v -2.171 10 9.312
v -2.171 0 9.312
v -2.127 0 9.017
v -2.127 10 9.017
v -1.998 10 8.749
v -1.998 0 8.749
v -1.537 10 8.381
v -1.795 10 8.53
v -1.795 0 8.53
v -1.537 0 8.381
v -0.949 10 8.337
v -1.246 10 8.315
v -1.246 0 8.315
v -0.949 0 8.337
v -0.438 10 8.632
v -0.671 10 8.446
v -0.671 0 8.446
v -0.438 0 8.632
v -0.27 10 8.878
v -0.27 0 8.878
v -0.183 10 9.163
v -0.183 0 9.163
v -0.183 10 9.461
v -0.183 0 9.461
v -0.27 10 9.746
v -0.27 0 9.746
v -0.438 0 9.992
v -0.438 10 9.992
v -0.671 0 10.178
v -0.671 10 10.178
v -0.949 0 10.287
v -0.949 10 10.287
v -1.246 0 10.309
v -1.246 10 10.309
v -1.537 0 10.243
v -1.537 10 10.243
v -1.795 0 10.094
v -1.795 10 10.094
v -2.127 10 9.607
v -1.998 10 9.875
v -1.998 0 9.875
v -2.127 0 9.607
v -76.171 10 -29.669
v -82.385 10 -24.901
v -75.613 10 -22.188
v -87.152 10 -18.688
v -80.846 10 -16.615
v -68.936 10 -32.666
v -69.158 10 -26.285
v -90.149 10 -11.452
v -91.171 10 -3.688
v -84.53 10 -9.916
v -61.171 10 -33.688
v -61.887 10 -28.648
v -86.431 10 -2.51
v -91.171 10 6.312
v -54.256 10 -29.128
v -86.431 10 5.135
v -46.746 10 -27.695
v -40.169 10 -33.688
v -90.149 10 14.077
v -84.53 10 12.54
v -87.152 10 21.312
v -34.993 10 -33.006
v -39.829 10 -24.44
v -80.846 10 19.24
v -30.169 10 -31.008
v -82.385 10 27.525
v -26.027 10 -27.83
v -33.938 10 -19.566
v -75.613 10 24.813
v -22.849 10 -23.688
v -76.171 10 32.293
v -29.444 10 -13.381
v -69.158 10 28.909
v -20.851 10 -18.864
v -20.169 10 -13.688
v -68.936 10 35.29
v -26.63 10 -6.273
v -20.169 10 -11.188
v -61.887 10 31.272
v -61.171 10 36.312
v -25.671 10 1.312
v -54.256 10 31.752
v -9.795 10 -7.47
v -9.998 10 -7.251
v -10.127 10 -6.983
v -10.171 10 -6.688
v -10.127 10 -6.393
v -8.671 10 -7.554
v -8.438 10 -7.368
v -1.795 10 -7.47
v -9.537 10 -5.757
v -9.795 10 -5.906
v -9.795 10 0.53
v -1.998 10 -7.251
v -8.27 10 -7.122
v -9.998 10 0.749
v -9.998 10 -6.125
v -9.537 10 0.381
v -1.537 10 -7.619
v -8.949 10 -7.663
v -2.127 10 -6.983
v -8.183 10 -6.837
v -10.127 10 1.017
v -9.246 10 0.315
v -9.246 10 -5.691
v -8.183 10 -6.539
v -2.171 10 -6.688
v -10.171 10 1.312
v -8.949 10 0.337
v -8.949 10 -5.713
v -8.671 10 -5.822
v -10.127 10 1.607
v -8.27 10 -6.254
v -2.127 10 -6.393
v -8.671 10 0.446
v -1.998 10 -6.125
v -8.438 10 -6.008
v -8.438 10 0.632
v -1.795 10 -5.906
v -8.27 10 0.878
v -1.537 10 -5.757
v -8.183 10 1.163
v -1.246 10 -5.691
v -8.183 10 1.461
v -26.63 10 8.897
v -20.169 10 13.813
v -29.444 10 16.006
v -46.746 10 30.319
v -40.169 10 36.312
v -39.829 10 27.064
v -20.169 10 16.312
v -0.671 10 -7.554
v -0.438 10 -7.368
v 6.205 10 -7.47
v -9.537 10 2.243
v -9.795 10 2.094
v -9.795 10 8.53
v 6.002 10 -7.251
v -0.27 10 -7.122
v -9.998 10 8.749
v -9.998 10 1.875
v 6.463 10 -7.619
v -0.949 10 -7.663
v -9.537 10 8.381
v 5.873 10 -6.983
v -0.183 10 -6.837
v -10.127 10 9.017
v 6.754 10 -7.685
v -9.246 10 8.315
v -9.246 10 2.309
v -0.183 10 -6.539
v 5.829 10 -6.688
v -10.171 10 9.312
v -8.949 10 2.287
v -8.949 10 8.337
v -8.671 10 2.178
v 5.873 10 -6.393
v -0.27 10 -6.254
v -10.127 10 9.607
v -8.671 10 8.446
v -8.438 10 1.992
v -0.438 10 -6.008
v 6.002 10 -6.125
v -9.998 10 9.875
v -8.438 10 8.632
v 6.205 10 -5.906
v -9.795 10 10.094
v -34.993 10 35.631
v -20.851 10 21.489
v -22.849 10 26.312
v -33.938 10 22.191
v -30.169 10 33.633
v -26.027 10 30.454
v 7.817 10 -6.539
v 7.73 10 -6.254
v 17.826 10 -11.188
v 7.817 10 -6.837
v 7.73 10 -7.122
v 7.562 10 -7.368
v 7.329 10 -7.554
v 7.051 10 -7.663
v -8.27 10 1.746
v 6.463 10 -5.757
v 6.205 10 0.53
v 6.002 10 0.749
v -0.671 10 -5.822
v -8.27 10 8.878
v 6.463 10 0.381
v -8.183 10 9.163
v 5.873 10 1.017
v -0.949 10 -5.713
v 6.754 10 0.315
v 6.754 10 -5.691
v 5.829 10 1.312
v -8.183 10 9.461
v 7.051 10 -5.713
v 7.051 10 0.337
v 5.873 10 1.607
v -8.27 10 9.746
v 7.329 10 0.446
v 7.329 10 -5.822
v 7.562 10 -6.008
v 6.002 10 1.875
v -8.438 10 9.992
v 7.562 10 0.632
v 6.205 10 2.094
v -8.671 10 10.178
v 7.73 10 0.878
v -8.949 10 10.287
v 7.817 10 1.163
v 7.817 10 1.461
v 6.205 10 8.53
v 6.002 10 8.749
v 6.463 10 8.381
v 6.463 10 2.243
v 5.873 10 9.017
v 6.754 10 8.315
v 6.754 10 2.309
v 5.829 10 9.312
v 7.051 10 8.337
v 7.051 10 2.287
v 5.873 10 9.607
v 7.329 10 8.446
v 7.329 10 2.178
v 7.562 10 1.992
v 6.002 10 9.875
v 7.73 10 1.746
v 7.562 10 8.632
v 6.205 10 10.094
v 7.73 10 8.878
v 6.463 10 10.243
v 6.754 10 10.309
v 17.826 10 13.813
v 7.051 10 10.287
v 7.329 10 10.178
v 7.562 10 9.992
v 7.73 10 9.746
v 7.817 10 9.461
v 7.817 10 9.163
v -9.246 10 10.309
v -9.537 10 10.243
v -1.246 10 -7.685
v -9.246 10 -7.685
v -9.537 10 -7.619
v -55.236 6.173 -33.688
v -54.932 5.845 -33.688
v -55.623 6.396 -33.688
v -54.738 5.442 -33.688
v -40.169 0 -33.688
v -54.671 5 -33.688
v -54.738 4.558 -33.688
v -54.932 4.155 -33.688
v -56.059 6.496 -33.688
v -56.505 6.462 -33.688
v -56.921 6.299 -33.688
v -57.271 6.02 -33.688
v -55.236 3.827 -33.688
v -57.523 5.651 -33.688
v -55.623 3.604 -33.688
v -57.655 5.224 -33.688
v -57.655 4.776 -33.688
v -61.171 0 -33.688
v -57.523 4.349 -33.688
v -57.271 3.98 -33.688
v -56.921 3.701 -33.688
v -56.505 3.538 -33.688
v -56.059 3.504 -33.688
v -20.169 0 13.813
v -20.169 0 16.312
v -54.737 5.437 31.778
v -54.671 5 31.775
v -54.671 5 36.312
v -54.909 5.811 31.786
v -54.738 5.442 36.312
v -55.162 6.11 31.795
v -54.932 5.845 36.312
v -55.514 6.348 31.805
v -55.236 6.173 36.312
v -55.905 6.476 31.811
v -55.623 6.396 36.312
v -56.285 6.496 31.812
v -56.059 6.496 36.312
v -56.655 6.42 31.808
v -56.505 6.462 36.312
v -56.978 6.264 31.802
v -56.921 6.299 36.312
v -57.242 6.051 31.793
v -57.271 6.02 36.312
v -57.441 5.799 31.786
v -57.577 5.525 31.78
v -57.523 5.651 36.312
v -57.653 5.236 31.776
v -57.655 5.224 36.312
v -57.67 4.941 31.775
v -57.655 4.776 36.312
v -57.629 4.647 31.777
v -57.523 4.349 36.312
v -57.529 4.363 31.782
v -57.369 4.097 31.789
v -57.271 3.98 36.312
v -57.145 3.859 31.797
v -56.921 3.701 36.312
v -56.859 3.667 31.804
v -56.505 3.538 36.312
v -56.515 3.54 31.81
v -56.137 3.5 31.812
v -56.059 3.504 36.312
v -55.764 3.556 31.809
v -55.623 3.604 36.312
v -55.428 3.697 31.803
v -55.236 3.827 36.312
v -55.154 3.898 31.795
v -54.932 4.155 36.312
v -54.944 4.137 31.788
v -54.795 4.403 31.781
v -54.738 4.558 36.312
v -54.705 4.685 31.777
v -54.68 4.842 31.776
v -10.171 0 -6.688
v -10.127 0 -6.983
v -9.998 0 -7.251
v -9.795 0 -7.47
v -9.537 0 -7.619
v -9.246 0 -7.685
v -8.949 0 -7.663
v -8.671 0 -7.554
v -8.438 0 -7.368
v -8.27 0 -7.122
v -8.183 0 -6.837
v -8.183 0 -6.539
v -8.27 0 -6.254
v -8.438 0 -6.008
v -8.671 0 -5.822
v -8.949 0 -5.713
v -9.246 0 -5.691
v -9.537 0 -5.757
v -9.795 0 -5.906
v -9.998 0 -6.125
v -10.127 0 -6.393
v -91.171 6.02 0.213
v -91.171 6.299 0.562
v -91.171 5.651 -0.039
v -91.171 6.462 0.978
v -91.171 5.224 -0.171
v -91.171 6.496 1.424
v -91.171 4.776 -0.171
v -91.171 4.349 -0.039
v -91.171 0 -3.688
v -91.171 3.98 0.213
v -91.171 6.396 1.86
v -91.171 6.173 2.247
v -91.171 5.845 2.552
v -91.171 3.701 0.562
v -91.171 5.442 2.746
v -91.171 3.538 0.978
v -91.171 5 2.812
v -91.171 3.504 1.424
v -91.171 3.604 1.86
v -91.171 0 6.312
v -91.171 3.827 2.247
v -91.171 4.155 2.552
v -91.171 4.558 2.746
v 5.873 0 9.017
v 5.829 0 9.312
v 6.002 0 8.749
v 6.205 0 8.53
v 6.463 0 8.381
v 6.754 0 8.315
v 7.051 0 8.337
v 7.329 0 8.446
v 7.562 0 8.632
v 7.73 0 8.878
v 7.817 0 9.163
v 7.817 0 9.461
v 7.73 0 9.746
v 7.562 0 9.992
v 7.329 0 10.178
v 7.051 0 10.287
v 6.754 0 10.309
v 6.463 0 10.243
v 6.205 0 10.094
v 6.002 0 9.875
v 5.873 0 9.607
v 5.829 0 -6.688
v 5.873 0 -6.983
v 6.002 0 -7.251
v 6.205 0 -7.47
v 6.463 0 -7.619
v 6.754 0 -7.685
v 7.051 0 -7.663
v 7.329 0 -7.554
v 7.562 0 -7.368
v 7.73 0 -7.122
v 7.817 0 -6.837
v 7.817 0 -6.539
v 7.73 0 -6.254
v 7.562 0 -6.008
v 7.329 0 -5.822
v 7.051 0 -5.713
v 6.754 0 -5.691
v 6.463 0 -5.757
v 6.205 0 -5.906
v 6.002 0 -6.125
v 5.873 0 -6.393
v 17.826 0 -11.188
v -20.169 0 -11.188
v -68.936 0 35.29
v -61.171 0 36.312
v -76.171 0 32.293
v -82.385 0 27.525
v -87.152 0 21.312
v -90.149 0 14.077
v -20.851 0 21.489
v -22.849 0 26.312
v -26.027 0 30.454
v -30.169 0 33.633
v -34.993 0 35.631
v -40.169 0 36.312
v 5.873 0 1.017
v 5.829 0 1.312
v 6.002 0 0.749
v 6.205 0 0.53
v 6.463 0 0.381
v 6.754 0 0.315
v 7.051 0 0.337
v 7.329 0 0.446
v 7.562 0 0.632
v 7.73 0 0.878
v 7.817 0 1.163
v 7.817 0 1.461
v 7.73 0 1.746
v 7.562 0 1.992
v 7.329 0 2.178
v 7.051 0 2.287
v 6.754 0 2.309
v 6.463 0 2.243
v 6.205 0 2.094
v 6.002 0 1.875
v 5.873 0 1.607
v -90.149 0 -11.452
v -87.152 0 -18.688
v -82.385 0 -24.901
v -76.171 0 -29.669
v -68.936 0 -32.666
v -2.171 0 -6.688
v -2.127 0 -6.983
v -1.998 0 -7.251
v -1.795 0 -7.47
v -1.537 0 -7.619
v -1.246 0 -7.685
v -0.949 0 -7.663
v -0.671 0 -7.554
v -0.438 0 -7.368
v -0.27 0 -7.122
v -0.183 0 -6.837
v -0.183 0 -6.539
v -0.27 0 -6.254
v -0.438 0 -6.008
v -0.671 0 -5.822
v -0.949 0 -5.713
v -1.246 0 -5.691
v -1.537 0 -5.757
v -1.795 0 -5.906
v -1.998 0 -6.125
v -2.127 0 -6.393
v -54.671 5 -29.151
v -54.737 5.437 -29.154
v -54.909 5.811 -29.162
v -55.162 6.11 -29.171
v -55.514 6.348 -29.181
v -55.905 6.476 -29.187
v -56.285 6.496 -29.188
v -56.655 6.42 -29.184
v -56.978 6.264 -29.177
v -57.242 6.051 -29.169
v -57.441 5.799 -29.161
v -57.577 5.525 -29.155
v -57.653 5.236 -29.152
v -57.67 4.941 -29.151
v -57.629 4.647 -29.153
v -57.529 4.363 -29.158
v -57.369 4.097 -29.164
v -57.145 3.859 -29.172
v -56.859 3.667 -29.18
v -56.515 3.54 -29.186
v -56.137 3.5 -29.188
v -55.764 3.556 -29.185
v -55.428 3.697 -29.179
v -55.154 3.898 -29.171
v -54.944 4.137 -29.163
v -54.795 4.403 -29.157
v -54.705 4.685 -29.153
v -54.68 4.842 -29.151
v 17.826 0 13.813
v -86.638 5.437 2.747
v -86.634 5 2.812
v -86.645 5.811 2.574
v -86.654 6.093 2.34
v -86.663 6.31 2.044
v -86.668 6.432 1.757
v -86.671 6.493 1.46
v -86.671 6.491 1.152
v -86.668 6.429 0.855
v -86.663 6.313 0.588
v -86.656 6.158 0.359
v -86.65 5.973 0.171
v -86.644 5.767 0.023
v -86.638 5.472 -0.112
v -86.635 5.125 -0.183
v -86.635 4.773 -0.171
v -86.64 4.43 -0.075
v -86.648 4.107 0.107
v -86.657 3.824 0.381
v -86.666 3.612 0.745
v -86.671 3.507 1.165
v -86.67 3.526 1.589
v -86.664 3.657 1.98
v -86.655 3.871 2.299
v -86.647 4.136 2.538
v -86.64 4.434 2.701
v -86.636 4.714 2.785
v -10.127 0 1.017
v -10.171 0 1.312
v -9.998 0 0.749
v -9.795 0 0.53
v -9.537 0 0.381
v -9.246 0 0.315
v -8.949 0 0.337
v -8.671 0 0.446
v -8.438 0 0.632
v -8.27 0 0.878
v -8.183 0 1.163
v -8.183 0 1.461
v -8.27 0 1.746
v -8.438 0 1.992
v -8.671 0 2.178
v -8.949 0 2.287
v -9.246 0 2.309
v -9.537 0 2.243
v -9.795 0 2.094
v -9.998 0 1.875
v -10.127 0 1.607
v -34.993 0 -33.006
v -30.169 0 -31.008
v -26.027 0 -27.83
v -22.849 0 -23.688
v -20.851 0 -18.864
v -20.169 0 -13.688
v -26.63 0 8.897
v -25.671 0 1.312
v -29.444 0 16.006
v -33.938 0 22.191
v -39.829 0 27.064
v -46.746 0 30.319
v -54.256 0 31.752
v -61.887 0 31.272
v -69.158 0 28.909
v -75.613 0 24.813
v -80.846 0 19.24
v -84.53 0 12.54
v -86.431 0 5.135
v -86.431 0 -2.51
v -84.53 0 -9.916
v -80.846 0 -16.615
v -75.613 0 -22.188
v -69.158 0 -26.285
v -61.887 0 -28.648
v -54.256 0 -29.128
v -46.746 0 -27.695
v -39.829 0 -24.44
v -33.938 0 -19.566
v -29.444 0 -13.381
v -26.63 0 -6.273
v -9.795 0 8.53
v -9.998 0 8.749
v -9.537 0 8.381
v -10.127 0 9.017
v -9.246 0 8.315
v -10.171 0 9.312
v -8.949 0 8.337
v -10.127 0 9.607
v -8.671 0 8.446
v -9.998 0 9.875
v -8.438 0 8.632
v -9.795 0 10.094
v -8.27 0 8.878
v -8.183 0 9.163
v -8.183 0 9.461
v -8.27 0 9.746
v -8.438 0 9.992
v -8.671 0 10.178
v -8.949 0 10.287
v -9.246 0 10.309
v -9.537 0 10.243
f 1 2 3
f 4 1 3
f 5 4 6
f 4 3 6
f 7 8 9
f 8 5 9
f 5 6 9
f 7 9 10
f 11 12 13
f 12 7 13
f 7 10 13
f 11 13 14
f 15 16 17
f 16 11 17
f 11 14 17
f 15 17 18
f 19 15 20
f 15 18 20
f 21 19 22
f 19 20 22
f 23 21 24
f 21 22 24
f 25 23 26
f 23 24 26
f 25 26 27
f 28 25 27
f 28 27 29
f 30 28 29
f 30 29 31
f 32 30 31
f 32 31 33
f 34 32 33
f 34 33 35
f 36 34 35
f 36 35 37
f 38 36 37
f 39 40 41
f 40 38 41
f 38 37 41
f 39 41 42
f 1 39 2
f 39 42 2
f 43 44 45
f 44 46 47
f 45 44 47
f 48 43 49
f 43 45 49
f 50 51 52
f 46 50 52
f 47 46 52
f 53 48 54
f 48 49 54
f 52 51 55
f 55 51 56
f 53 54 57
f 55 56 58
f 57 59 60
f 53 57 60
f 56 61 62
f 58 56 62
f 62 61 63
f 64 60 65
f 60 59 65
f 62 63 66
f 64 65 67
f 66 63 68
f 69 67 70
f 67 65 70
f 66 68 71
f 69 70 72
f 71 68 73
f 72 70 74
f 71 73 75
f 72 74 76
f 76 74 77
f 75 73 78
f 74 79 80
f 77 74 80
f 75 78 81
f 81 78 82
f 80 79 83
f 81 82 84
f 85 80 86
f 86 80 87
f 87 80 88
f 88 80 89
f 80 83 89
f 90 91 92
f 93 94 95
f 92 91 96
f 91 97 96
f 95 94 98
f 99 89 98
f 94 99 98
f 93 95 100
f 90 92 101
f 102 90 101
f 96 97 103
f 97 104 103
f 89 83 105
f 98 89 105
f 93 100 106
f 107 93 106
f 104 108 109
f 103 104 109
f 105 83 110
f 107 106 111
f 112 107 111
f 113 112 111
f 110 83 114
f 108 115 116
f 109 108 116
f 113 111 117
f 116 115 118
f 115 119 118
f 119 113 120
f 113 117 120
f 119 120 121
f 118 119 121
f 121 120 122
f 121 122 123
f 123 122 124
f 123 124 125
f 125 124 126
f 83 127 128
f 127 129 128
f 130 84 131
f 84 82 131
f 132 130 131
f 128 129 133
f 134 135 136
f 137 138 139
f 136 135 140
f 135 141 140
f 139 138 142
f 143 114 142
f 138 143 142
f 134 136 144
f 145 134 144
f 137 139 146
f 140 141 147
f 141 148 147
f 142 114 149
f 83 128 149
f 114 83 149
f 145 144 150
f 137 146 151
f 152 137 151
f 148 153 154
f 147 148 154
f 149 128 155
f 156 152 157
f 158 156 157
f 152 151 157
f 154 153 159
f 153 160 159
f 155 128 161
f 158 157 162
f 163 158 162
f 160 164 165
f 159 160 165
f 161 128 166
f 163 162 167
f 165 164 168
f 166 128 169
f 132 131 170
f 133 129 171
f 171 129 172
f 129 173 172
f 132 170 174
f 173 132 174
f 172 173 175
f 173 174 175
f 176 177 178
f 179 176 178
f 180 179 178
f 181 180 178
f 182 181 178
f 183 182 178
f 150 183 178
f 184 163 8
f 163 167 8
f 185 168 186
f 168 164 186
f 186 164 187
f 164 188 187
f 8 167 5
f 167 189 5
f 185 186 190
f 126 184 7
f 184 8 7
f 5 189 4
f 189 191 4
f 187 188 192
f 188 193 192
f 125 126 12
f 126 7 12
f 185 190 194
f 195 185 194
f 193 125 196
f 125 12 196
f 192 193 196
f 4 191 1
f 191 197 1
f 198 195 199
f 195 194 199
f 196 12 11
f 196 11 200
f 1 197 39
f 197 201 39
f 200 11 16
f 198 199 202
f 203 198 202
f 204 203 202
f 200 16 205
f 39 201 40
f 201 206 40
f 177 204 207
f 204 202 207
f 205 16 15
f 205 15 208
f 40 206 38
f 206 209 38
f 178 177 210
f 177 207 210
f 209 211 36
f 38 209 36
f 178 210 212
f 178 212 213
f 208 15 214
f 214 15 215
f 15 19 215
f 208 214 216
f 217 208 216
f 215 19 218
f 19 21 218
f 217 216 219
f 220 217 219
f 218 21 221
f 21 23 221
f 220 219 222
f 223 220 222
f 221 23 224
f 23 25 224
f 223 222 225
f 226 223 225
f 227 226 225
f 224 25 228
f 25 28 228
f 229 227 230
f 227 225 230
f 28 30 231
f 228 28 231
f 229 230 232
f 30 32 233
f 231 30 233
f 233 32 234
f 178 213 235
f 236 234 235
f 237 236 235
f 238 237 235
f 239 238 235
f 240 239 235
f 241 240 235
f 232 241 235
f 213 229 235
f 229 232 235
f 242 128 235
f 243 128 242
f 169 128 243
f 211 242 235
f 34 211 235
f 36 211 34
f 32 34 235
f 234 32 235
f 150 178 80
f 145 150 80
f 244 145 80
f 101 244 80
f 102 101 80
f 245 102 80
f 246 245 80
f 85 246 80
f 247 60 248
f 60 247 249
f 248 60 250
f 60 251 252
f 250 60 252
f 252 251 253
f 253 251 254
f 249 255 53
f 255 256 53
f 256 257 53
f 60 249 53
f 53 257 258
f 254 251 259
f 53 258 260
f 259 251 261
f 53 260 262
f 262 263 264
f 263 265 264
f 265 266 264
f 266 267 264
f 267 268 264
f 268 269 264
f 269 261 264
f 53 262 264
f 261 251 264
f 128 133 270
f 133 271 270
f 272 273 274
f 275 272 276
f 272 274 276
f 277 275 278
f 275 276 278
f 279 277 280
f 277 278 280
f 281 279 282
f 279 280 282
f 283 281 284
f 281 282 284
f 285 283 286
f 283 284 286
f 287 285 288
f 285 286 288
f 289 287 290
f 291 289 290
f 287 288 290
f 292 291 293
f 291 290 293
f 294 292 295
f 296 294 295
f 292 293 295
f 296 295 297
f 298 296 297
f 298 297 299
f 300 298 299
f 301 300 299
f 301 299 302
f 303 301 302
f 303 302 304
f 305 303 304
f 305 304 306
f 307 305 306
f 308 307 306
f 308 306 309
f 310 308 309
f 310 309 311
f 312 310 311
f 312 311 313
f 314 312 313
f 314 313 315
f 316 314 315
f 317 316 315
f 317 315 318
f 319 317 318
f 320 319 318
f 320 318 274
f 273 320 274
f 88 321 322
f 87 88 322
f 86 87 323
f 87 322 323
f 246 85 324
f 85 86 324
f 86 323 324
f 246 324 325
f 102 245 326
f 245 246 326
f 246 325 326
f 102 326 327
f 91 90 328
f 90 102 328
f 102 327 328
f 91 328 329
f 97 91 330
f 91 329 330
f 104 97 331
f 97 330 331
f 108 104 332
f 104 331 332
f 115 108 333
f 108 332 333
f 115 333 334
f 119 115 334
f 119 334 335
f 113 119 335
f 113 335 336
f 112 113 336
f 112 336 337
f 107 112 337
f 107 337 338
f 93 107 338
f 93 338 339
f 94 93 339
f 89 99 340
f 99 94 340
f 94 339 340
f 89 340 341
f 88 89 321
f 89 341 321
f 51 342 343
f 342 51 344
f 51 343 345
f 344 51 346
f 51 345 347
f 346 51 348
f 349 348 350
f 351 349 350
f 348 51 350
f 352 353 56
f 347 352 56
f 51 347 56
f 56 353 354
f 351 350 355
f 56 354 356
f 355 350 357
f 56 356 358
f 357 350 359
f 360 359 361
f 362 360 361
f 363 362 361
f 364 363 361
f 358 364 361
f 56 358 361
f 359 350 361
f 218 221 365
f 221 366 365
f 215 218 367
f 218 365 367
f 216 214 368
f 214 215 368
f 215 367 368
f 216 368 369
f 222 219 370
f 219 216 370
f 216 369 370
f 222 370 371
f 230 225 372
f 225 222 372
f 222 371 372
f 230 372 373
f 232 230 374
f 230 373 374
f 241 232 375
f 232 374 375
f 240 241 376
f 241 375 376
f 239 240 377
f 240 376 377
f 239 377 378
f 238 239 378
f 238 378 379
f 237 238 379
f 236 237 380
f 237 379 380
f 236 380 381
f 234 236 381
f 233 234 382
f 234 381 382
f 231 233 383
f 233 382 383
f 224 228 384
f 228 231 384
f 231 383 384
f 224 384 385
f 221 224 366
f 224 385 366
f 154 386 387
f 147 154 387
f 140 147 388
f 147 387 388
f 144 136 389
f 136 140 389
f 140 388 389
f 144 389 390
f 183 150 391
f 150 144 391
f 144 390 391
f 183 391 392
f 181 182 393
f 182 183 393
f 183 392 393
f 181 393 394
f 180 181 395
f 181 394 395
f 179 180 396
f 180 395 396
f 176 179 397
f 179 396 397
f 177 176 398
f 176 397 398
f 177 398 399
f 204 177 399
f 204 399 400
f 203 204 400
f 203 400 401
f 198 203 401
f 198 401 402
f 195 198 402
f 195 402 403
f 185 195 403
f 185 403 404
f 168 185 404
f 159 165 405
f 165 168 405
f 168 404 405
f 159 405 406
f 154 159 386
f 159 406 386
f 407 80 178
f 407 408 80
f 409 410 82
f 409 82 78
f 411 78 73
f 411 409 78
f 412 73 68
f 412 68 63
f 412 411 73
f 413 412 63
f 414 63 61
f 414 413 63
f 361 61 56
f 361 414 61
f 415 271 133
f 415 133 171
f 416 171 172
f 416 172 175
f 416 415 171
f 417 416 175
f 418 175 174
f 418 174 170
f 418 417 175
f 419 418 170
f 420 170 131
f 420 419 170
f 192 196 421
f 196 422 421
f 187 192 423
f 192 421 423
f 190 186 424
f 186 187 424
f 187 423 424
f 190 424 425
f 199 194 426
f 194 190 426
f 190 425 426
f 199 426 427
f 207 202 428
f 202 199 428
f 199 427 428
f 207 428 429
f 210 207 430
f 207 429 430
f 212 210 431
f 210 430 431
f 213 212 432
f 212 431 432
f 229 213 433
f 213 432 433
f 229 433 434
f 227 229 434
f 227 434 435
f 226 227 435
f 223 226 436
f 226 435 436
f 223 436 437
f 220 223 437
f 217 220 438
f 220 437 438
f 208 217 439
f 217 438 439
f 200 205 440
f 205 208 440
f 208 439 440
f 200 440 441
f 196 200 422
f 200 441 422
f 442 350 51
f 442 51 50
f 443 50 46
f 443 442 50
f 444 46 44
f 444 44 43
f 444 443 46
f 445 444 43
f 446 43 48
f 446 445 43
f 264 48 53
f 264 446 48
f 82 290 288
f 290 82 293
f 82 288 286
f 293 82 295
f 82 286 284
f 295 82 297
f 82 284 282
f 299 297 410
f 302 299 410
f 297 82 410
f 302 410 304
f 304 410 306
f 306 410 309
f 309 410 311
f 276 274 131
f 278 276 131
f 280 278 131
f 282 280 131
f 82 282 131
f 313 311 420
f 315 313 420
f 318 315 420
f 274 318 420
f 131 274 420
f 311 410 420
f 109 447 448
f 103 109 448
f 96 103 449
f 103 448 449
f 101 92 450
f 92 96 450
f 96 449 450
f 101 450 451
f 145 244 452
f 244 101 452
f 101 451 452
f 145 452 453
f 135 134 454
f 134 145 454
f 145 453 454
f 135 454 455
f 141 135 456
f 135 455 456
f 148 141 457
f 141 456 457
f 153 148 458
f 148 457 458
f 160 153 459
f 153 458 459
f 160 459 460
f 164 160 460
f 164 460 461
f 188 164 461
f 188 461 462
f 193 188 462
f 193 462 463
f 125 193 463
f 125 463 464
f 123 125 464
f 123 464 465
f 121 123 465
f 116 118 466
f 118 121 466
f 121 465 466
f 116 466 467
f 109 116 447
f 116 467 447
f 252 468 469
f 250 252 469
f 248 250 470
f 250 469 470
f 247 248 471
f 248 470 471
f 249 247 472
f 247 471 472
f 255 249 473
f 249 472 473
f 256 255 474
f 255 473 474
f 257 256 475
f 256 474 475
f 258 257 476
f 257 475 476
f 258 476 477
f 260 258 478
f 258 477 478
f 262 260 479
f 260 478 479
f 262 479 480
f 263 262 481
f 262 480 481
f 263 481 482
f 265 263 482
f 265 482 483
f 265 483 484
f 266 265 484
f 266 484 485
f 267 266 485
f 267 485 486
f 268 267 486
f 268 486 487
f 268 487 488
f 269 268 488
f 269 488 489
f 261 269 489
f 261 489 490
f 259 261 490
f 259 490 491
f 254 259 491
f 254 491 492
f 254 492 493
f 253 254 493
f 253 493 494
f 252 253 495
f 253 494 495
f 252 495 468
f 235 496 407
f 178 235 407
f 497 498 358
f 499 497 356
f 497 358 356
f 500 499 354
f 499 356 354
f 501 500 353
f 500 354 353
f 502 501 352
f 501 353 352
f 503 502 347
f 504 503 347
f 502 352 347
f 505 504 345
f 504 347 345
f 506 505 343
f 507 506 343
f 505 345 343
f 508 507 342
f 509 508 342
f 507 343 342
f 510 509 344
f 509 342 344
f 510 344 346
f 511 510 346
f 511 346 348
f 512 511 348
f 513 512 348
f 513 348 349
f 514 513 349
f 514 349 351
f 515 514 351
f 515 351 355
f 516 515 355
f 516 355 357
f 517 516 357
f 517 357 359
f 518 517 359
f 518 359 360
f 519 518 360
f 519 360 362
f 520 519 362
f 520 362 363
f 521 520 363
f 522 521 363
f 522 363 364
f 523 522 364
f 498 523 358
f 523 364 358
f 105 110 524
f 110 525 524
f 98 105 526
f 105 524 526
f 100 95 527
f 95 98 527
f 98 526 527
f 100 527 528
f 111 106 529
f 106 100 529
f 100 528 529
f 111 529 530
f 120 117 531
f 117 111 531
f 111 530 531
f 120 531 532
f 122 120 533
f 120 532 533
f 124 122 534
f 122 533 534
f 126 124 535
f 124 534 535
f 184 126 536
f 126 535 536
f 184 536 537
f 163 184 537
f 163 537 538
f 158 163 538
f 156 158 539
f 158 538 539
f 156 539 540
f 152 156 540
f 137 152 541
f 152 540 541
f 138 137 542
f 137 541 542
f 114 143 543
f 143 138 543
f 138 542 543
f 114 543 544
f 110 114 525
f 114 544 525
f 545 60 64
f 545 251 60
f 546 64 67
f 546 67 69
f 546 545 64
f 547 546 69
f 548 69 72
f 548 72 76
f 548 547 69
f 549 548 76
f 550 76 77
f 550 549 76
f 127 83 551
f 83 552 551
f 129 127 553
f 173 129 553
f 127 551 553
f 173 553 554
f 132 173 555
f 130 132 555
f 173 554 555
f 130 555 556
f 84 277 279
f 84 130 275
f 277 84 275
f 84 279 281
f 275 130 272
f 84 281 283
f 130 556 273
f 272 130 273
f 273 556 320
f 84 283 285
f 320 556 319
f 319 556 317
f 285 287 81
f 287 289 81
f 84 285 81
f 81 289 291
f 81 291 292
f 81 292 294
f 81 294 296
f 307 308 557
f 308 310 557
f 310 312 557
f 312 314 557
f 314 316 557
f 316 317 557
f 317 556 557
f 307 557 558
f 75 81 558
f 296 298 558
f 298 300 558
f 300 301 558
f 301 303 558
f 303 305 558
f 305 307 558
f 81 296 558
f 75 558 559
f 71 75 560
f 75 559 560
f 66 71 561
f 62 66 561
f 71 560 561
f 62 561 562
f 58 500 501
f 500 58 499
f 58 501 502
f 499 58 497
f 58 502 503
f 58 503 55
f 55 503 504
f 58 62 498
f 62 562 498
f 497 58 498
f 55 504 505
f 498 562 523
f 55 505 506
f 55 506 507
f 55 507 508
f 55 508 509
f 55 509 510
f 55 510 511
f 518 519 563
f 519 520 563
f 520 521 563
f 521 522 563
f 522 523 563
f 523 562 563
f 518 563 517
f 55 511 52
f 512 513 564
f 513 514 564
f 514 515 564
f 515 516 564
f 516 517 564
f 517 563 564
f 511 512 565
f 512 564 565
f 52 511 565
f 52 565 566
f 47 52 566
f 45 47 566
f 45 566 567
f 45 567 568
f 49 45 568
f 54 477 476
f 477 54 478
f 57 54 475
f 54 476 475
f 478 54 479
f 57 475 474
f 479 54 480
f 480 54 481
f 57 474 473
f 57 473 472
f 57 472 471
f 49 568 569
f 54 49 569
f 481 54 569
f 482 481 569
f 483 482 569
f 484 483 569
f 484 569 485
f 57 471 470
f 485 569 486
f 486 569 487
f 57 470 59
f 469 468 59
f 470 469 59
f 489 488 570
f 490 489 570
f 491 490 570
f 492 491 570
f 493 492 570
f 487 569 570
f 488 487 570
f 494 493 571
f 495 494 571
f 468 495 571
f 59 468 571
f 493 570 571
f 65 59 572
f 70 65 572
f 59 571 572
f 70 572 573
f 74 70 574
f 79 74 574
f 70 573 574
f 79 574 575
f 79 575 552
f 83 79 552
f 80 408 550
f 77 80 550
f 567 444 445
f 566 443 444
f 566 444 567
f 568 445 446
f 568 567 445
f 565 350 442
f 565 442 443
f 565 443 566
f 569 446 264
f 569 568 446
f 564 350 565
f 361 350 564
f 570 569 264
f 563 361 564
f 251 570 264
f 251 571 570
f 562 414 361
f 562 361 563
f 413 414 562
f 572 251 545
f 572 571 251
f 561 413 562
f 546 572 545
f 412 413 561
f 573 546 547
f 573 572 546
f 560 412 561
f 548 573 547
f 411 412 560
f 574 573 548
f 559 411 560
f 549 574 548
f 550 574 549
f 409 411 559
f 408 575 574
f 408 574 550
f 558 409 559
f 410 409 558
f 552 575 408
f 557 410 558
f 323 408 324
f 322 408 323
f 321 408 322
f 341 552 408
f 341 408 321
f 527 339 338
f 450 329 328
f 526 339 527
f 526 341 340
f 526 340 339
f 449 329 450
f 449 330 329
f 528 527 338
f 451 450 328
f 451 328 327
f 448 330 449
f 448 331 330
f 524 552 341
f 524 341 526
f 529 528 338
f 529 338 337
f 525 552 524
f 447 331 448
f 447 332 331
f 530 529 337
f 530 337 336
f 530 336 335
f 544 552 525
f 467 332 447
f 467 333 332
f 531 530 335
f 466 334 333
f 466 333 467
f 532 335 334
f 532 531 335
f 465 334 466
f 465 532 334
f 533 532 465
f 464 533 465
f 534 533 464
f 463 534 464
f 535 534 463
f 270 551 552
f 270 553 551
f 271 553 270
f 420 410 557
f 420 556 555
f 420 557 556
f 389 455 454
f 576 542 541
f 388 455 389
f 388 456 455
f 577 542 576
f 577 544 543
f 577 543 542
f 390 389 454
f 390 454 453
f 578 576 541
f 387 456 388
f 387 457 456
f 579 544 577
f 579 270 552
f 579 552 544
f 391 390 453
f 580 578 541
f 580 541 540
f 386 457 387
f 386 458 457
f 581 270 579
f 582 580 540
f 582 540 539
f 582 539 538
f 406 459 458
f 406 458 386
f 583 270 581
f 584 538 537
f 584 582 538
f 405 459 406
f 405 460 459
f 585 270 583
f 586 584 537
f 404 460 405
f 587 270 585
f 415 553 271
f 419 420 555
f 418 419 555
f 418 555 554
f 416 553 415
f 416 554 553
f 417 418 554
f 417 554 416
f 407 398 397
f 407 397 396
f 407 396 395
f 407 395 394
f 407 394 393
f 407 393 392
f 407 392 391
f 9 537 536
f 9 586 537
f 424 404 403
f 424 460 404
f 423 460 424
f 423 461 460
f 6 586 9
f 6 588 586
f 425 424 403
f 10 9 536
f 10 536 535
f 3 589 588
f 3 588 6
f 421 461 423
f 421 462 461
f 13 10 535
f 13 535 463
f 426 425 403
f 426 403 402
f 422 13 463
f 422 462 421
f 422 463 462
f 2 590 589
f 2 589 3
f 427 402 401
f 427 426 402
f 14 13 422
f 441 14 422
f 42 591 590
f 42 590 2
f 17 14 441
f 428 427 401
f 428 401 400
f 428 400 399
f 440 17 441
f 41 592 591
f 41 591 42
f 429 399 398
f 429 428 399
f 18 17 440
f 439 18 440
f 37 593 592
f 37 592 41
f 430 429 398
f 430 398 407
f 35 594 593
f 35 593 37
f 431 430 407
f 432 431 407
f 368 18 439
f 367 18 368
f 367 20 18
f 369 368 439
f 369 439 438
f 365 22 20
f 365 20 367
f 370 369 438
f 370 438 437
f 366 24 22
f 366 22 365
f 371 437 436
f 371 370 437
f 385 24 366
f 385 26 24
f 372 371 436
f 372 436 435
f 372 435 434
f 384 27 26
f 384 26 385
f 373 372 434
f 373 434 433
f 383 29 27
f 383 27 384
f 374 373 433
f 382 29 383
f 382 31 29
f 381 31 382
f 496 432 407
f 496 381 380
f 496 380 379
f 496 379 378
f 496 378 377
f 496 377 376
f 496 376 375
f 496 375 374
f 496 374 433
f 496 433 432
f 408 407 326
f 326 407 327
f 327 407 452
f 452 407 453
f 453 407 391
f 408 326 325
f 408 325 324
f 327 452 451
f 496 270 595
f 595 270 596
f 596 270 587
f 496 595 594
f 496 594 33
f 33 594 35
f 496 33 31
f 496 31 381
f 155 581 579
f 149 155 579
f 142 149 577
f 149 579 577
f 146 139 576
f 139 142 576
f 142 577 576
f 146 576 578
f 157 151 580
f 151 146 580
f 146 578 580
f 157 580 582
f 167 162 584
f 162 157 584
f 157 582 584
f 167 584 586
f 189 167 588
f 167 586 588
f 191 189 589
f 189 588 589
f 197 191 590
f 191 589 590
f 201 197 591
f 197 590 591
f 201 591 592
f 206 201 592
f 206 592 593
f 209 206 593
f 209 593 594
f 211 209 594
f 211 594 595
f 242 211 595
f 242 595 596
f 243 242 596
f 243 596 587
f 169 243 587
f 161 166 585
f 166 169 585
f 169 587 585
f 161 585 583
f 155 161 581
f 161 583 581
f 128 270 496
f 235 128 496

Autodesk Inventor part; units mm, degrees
ref_plane "YZ Plane" through (0, 0, 0) normal (1, 0, 0) x (0, 1, 0)
ref_plane "XZ Plane" through (0, 0, 0) normal (0, 1, 0) x (-1, 0, 0)
ref_plane "XY Plane" through (0, 0, 0) normal (0, 0, 1) x (1, 0, 0)
sketch "Esquisse1" plane through (0, 0, 0) normal (0, 1, 0) x (-1, 0, 0)
  line L0 (-17.8264, 13.8129) -> (-17.8264, 6.3115) projected
  line L1 (20.1692, 13.8129) -> (-17.8264, 13.8129) projected
  line L2 (20.1692, 6.3115) -> (20.1692, 13.8129) projected
  line L3 (20.1692, 6.3115) -> (20.1692, 5.0615) projected
  arc A0 (19.9192, 4.8115) -> (20.1692, 5.0615) centre (19.9192, 5.0615) ccw projected
  line L4 (16.2667, 4.8115) -> (19.9192, 4.8115) projected
  arc A1 (16.2667, 4.8115) -> (16.0167, 4.5615) centre (16.2667, 4.5615) ccw projected
  line L5 (16.0167, -1.9385) -> (16.0167, 4.5615) projected
  arc A2 (16.0167, -1.9385) -> (16.2667, -2.1885) centre (16.2667, -1.9385) ccw projected
  line L6 (18.6692, -2.1885) -> (16.2667, -2.1885) projected
  arc A3 (18.6692, -2.1885) -> (18.9192, -1.9385) centre (18.6692, -1.9385) ccw projected
  line L7 (18.9192, 2.8115) -> (18.9192, -1.9385) projected
  arc A4 (18.9192, 3.8115) -> (18.9192, 2.8115) centre (18.9192, 3.3115) ccw projected
  line L8 (19.9192, 3.8115) -> (18.9192, 3.8115) projected
  arc A5 (20.1692, 3.5615) -> (19.9192, 3.8115) centre (19.9192, 3.5615) ccw projected
  line L9 (20.1692, 3.5615) -> (20.1692, -3.6892) projected
  line L10 (20.1692, -11.1878) -> (20.1692, -3.6892) projected
  line L11 (20.1692, -11.1878) -> (-17.8264, -11.1878) projected
  line L12 (-17.8264, -3.6892) -> (-17.8264, -11.1878) projected
  line L13 (-17.8264, 3.5615) -> (-17.8264, -3.6892) projected
  arc A6 (-17.5764, 3.8115) -> (-17.8264, 3.5615) centre (-17.5764, 3.5615) ccw projected
  line L14 (-16.5764, 3.8115) -> (-17.5764, 3.8115) projected
  arc A7 (-16.5764, 2.8115) -> (-16.5764, 3.8115) centre (-16.5764, 3.3115) ccw projected
  line L15 (-16.5764, -1.9385) -> (-16.5764, 2.8115) projected
  arc A8 (-16.5764, -1.9385) -> (-16.3264, -2.1885) centre (-16.3264, -1.9385) ccw projected
  line L16 (-13.9239, -2.1885) -> (-16.3264, -2.1885) projected
  arc A9 (-13.9239, -2.1885) -> (-13.6739, -1.9385) centre (-13.9239, -1.9385) ccw projected
  line L17 (-13.6739, 4.5615) -> (-13.6739, -1.9385) projected
  arc A10 (-13.6739, 4.5615) -> (-13.9239, 4.8115) centre (-13.9239, 4.5615) ccw projected
  line L18 (-17.5764, 4.8115) -> (-13.9239, 4.8115) projected
  arc A11 (-17.8264, 5.0615) -> (-17.5764, 4.8115) centre (-17.5764, 5.0615) ccw projected
  line L19 (-17.8264, 6.3115) -> (-17.8264, 5.0615) projected
  circle A12 centre (-14.8286, -6.6881) radius 1 projected
  circle A13 centre (-14.8286, 9.3119) radius 1 projected
  circle A14 centre (17.1714, 9.3119) radius 1 projected
  circle A15 centre (17.1714, -6.6881) radius 1 projected
  circle A16 centre (-6.8286, -6.6881) radius 1 projected
  circle A17 centre (-6.8286, 9.3119) radius 1 projected
  circle A18 centre (9.1714, 9.3119) radius 1 projected
  circle A19 centre (9.1714, -6.6881) radius 1 projected
  circle A20 centre (-6.8286, 1.3119) radius 1 projected
  circle A21 centre (1.1714, 9.3119) radius 1 projected
  circle A22 centre (9.1714, 1.3119) radius 1 projected
  circle A23 centre (1.1714, -6.6881) radius 1 projected
  line L20 (6.1717, 4.2695) -> (6.1717, -1.6458) projected
  line L21 (3.8644, 4.2695) -> (6.1717, 4.2695) projected
  arc A24 (3.8644, 4.2695) -> (-1.5216, 4.2695) centre (1.1714, 1.3119) ccw projected
  line L22 (-3.8289, 4.2695) -> (-1.5216, 4.2695) projected
  line L23 (-3.8289, -1.6458) -> (-3.8289, 4.2695) projected
  line L24 (-1.5216, -1.6458) -> (-3.8289, -1.6458) projected
  arc A25 (-1.5216, -1.6458) -> (3.8644, -1.6458) centre (1.1714, 1.3119) ccw projected
  line L25 (6.1717, -1.6458) -> (3.8644, -1.6458) projected
  line L26 (-17.8264, 13.8129) -> (20.1692, 13.8129)
  line L27 (20.1692, 13.8129) -> (20.1692, -11.1878)
  line L28 (20.1692, -11.1878) -> (-17.8264, -11.1878)
  line L29 (-17.8264, -11.1878) -> (-17.8264, 13.8129)
  circle A26 centre (-6.8286, -6.6881) radius 1
  circle A27 centre (-6.8286, 1.3119) radius 1
  circle A28 centre (-6.8286, 9.3119) radius 1
  circle A29 centre (1.1714, 9.3119) radius 1
  circle A30 centre (1.1714, -6.6881) radius 1
  circle A31 centre (9.1714, -6.6881) radius 1
  circle A32 centre (9.1714, 1.3119) radius 1
  circle A33 centre (9.1714, 9.3119) radius 1
extrude "Extrusion1" add sketch "Esquisse1" along normal blind 10 contours L1 L2 L3 A0 L4 A1 L5 A2 L6 A3 L7 A4 L8 A5 L9 L10 L11 L12 L13 A6 L14 A7 L15 A8 L16 A9 L17 A10 L18 A11 L19 L0 | A11 L18 A10 L17 A9 L16 A8 L15 A7 L14 A6 L29 | L27 A5 L8 A4 L7 A3 L6 A2 L5 A1 L4 A0 | A12 | A13 | A14 | A15 | L20 L25 A25 L24 L23 L22 A24 L21
sketch "Esquisse2" plane through (0, 0, 0) normal (0, -1, 0) x (1, 0, 0)
  circle A0 centre (-56.1714, 1.3122) radius 30
  line L0 (-61.1714, 36.3122) -> (-40.1692, 36.3122)
  line L1 (-20.1692, 16.3122) -> (-20.1692, -13.6878)
  line L2 (-40.1692, -33.6878) -> (-61.1714, -33.6878)
  line L3 (-91.1714, -3.6878) -> (-91.1714, 6.3122)
  arc A1 (-61.1714, 36.3122) -> (-91.1714, 6.3122) centre (-61.1714, 6.3122) ccw
  arc A2 (-91.1714, -3.6878) -> (-61.1714, -33.6878) centre (-61.1714, -3.6878) ccw
  line L4 (-20.1692, -11.1878) -> (-20.1692, 13.8129) projected
  arc A3 (-20.1692, 16.3122) -> (-40.1692, 36.3122) centre (-40.1692, 16.3122) ccw
  arc A4 (-40.1692, -33.6878) -> (-20.1692, -13.6878) centre (-40.1692, -13.6878) ccw
  point P0 (0, 0)
  dimension "d4" = 35
  dimension "d5" = 35
  dimension "d6" = 35
  dimension "d7" = 30
  dimension "d8" = 30
  dimension "d9" = 0
  dimension "d10" = 20
  dimension "d11" = 20
extrude "Extrusion2" add sketch "Esquisse2" against normal blind 10
sketch "Esquisse3" plane through (-61.1714, 0, 36.3122) normal (0, 0, 1) x (1, 0, 0)
  line L0 (35, 92.5) -> (35, -82.5)
  circle A0 centre (5, 5) radius 1.5
  line L1 (0, 10) -> (21.0022, 10) projected
  point P0 (61.1714, 0)
  dimension "d14" = 30
  dimension "d15" = 3
  dimension "d16" = 5
extrude "Extrusion3" cut sketch "Esquisse3" against normal through all
sketch "Esquisse4" plane through (-91.1714, 0, -3.6878) normal (-1, 0, 0) x (0, 0, 1)
  line L0 (35, 92.5) -> (35, -82.5)
  circle A0 centre (5, 5) radius 1.5
  line L1 (0, 0) -> (10, 0) projected
  point P0 (3.6878, 0)
  dimension "d19" = 3
  dimension "d20" = 30
  dimension "d21" = 5
extrude "Extrusion4" cut sketch "Esquisse4" against normal up to next
sketch "Esquisse5" plane through (0, 0, 0) normal (0, -1, 0) x (1, 0, 0)
  circle A0 centre (-56.1714, 1.3122) radius 30.5
  circle A1 centre (-56.1714, 1.3122) radius 30 projected
  point P0 (0, 0)
  dimension "d25" = 61
  dimension "d26" = 0
  dimension "d27" = 0
extrude "Extrusion5" cut sketch "Esquisse5" against normal through all
properties part number "rotation-recuperation"
